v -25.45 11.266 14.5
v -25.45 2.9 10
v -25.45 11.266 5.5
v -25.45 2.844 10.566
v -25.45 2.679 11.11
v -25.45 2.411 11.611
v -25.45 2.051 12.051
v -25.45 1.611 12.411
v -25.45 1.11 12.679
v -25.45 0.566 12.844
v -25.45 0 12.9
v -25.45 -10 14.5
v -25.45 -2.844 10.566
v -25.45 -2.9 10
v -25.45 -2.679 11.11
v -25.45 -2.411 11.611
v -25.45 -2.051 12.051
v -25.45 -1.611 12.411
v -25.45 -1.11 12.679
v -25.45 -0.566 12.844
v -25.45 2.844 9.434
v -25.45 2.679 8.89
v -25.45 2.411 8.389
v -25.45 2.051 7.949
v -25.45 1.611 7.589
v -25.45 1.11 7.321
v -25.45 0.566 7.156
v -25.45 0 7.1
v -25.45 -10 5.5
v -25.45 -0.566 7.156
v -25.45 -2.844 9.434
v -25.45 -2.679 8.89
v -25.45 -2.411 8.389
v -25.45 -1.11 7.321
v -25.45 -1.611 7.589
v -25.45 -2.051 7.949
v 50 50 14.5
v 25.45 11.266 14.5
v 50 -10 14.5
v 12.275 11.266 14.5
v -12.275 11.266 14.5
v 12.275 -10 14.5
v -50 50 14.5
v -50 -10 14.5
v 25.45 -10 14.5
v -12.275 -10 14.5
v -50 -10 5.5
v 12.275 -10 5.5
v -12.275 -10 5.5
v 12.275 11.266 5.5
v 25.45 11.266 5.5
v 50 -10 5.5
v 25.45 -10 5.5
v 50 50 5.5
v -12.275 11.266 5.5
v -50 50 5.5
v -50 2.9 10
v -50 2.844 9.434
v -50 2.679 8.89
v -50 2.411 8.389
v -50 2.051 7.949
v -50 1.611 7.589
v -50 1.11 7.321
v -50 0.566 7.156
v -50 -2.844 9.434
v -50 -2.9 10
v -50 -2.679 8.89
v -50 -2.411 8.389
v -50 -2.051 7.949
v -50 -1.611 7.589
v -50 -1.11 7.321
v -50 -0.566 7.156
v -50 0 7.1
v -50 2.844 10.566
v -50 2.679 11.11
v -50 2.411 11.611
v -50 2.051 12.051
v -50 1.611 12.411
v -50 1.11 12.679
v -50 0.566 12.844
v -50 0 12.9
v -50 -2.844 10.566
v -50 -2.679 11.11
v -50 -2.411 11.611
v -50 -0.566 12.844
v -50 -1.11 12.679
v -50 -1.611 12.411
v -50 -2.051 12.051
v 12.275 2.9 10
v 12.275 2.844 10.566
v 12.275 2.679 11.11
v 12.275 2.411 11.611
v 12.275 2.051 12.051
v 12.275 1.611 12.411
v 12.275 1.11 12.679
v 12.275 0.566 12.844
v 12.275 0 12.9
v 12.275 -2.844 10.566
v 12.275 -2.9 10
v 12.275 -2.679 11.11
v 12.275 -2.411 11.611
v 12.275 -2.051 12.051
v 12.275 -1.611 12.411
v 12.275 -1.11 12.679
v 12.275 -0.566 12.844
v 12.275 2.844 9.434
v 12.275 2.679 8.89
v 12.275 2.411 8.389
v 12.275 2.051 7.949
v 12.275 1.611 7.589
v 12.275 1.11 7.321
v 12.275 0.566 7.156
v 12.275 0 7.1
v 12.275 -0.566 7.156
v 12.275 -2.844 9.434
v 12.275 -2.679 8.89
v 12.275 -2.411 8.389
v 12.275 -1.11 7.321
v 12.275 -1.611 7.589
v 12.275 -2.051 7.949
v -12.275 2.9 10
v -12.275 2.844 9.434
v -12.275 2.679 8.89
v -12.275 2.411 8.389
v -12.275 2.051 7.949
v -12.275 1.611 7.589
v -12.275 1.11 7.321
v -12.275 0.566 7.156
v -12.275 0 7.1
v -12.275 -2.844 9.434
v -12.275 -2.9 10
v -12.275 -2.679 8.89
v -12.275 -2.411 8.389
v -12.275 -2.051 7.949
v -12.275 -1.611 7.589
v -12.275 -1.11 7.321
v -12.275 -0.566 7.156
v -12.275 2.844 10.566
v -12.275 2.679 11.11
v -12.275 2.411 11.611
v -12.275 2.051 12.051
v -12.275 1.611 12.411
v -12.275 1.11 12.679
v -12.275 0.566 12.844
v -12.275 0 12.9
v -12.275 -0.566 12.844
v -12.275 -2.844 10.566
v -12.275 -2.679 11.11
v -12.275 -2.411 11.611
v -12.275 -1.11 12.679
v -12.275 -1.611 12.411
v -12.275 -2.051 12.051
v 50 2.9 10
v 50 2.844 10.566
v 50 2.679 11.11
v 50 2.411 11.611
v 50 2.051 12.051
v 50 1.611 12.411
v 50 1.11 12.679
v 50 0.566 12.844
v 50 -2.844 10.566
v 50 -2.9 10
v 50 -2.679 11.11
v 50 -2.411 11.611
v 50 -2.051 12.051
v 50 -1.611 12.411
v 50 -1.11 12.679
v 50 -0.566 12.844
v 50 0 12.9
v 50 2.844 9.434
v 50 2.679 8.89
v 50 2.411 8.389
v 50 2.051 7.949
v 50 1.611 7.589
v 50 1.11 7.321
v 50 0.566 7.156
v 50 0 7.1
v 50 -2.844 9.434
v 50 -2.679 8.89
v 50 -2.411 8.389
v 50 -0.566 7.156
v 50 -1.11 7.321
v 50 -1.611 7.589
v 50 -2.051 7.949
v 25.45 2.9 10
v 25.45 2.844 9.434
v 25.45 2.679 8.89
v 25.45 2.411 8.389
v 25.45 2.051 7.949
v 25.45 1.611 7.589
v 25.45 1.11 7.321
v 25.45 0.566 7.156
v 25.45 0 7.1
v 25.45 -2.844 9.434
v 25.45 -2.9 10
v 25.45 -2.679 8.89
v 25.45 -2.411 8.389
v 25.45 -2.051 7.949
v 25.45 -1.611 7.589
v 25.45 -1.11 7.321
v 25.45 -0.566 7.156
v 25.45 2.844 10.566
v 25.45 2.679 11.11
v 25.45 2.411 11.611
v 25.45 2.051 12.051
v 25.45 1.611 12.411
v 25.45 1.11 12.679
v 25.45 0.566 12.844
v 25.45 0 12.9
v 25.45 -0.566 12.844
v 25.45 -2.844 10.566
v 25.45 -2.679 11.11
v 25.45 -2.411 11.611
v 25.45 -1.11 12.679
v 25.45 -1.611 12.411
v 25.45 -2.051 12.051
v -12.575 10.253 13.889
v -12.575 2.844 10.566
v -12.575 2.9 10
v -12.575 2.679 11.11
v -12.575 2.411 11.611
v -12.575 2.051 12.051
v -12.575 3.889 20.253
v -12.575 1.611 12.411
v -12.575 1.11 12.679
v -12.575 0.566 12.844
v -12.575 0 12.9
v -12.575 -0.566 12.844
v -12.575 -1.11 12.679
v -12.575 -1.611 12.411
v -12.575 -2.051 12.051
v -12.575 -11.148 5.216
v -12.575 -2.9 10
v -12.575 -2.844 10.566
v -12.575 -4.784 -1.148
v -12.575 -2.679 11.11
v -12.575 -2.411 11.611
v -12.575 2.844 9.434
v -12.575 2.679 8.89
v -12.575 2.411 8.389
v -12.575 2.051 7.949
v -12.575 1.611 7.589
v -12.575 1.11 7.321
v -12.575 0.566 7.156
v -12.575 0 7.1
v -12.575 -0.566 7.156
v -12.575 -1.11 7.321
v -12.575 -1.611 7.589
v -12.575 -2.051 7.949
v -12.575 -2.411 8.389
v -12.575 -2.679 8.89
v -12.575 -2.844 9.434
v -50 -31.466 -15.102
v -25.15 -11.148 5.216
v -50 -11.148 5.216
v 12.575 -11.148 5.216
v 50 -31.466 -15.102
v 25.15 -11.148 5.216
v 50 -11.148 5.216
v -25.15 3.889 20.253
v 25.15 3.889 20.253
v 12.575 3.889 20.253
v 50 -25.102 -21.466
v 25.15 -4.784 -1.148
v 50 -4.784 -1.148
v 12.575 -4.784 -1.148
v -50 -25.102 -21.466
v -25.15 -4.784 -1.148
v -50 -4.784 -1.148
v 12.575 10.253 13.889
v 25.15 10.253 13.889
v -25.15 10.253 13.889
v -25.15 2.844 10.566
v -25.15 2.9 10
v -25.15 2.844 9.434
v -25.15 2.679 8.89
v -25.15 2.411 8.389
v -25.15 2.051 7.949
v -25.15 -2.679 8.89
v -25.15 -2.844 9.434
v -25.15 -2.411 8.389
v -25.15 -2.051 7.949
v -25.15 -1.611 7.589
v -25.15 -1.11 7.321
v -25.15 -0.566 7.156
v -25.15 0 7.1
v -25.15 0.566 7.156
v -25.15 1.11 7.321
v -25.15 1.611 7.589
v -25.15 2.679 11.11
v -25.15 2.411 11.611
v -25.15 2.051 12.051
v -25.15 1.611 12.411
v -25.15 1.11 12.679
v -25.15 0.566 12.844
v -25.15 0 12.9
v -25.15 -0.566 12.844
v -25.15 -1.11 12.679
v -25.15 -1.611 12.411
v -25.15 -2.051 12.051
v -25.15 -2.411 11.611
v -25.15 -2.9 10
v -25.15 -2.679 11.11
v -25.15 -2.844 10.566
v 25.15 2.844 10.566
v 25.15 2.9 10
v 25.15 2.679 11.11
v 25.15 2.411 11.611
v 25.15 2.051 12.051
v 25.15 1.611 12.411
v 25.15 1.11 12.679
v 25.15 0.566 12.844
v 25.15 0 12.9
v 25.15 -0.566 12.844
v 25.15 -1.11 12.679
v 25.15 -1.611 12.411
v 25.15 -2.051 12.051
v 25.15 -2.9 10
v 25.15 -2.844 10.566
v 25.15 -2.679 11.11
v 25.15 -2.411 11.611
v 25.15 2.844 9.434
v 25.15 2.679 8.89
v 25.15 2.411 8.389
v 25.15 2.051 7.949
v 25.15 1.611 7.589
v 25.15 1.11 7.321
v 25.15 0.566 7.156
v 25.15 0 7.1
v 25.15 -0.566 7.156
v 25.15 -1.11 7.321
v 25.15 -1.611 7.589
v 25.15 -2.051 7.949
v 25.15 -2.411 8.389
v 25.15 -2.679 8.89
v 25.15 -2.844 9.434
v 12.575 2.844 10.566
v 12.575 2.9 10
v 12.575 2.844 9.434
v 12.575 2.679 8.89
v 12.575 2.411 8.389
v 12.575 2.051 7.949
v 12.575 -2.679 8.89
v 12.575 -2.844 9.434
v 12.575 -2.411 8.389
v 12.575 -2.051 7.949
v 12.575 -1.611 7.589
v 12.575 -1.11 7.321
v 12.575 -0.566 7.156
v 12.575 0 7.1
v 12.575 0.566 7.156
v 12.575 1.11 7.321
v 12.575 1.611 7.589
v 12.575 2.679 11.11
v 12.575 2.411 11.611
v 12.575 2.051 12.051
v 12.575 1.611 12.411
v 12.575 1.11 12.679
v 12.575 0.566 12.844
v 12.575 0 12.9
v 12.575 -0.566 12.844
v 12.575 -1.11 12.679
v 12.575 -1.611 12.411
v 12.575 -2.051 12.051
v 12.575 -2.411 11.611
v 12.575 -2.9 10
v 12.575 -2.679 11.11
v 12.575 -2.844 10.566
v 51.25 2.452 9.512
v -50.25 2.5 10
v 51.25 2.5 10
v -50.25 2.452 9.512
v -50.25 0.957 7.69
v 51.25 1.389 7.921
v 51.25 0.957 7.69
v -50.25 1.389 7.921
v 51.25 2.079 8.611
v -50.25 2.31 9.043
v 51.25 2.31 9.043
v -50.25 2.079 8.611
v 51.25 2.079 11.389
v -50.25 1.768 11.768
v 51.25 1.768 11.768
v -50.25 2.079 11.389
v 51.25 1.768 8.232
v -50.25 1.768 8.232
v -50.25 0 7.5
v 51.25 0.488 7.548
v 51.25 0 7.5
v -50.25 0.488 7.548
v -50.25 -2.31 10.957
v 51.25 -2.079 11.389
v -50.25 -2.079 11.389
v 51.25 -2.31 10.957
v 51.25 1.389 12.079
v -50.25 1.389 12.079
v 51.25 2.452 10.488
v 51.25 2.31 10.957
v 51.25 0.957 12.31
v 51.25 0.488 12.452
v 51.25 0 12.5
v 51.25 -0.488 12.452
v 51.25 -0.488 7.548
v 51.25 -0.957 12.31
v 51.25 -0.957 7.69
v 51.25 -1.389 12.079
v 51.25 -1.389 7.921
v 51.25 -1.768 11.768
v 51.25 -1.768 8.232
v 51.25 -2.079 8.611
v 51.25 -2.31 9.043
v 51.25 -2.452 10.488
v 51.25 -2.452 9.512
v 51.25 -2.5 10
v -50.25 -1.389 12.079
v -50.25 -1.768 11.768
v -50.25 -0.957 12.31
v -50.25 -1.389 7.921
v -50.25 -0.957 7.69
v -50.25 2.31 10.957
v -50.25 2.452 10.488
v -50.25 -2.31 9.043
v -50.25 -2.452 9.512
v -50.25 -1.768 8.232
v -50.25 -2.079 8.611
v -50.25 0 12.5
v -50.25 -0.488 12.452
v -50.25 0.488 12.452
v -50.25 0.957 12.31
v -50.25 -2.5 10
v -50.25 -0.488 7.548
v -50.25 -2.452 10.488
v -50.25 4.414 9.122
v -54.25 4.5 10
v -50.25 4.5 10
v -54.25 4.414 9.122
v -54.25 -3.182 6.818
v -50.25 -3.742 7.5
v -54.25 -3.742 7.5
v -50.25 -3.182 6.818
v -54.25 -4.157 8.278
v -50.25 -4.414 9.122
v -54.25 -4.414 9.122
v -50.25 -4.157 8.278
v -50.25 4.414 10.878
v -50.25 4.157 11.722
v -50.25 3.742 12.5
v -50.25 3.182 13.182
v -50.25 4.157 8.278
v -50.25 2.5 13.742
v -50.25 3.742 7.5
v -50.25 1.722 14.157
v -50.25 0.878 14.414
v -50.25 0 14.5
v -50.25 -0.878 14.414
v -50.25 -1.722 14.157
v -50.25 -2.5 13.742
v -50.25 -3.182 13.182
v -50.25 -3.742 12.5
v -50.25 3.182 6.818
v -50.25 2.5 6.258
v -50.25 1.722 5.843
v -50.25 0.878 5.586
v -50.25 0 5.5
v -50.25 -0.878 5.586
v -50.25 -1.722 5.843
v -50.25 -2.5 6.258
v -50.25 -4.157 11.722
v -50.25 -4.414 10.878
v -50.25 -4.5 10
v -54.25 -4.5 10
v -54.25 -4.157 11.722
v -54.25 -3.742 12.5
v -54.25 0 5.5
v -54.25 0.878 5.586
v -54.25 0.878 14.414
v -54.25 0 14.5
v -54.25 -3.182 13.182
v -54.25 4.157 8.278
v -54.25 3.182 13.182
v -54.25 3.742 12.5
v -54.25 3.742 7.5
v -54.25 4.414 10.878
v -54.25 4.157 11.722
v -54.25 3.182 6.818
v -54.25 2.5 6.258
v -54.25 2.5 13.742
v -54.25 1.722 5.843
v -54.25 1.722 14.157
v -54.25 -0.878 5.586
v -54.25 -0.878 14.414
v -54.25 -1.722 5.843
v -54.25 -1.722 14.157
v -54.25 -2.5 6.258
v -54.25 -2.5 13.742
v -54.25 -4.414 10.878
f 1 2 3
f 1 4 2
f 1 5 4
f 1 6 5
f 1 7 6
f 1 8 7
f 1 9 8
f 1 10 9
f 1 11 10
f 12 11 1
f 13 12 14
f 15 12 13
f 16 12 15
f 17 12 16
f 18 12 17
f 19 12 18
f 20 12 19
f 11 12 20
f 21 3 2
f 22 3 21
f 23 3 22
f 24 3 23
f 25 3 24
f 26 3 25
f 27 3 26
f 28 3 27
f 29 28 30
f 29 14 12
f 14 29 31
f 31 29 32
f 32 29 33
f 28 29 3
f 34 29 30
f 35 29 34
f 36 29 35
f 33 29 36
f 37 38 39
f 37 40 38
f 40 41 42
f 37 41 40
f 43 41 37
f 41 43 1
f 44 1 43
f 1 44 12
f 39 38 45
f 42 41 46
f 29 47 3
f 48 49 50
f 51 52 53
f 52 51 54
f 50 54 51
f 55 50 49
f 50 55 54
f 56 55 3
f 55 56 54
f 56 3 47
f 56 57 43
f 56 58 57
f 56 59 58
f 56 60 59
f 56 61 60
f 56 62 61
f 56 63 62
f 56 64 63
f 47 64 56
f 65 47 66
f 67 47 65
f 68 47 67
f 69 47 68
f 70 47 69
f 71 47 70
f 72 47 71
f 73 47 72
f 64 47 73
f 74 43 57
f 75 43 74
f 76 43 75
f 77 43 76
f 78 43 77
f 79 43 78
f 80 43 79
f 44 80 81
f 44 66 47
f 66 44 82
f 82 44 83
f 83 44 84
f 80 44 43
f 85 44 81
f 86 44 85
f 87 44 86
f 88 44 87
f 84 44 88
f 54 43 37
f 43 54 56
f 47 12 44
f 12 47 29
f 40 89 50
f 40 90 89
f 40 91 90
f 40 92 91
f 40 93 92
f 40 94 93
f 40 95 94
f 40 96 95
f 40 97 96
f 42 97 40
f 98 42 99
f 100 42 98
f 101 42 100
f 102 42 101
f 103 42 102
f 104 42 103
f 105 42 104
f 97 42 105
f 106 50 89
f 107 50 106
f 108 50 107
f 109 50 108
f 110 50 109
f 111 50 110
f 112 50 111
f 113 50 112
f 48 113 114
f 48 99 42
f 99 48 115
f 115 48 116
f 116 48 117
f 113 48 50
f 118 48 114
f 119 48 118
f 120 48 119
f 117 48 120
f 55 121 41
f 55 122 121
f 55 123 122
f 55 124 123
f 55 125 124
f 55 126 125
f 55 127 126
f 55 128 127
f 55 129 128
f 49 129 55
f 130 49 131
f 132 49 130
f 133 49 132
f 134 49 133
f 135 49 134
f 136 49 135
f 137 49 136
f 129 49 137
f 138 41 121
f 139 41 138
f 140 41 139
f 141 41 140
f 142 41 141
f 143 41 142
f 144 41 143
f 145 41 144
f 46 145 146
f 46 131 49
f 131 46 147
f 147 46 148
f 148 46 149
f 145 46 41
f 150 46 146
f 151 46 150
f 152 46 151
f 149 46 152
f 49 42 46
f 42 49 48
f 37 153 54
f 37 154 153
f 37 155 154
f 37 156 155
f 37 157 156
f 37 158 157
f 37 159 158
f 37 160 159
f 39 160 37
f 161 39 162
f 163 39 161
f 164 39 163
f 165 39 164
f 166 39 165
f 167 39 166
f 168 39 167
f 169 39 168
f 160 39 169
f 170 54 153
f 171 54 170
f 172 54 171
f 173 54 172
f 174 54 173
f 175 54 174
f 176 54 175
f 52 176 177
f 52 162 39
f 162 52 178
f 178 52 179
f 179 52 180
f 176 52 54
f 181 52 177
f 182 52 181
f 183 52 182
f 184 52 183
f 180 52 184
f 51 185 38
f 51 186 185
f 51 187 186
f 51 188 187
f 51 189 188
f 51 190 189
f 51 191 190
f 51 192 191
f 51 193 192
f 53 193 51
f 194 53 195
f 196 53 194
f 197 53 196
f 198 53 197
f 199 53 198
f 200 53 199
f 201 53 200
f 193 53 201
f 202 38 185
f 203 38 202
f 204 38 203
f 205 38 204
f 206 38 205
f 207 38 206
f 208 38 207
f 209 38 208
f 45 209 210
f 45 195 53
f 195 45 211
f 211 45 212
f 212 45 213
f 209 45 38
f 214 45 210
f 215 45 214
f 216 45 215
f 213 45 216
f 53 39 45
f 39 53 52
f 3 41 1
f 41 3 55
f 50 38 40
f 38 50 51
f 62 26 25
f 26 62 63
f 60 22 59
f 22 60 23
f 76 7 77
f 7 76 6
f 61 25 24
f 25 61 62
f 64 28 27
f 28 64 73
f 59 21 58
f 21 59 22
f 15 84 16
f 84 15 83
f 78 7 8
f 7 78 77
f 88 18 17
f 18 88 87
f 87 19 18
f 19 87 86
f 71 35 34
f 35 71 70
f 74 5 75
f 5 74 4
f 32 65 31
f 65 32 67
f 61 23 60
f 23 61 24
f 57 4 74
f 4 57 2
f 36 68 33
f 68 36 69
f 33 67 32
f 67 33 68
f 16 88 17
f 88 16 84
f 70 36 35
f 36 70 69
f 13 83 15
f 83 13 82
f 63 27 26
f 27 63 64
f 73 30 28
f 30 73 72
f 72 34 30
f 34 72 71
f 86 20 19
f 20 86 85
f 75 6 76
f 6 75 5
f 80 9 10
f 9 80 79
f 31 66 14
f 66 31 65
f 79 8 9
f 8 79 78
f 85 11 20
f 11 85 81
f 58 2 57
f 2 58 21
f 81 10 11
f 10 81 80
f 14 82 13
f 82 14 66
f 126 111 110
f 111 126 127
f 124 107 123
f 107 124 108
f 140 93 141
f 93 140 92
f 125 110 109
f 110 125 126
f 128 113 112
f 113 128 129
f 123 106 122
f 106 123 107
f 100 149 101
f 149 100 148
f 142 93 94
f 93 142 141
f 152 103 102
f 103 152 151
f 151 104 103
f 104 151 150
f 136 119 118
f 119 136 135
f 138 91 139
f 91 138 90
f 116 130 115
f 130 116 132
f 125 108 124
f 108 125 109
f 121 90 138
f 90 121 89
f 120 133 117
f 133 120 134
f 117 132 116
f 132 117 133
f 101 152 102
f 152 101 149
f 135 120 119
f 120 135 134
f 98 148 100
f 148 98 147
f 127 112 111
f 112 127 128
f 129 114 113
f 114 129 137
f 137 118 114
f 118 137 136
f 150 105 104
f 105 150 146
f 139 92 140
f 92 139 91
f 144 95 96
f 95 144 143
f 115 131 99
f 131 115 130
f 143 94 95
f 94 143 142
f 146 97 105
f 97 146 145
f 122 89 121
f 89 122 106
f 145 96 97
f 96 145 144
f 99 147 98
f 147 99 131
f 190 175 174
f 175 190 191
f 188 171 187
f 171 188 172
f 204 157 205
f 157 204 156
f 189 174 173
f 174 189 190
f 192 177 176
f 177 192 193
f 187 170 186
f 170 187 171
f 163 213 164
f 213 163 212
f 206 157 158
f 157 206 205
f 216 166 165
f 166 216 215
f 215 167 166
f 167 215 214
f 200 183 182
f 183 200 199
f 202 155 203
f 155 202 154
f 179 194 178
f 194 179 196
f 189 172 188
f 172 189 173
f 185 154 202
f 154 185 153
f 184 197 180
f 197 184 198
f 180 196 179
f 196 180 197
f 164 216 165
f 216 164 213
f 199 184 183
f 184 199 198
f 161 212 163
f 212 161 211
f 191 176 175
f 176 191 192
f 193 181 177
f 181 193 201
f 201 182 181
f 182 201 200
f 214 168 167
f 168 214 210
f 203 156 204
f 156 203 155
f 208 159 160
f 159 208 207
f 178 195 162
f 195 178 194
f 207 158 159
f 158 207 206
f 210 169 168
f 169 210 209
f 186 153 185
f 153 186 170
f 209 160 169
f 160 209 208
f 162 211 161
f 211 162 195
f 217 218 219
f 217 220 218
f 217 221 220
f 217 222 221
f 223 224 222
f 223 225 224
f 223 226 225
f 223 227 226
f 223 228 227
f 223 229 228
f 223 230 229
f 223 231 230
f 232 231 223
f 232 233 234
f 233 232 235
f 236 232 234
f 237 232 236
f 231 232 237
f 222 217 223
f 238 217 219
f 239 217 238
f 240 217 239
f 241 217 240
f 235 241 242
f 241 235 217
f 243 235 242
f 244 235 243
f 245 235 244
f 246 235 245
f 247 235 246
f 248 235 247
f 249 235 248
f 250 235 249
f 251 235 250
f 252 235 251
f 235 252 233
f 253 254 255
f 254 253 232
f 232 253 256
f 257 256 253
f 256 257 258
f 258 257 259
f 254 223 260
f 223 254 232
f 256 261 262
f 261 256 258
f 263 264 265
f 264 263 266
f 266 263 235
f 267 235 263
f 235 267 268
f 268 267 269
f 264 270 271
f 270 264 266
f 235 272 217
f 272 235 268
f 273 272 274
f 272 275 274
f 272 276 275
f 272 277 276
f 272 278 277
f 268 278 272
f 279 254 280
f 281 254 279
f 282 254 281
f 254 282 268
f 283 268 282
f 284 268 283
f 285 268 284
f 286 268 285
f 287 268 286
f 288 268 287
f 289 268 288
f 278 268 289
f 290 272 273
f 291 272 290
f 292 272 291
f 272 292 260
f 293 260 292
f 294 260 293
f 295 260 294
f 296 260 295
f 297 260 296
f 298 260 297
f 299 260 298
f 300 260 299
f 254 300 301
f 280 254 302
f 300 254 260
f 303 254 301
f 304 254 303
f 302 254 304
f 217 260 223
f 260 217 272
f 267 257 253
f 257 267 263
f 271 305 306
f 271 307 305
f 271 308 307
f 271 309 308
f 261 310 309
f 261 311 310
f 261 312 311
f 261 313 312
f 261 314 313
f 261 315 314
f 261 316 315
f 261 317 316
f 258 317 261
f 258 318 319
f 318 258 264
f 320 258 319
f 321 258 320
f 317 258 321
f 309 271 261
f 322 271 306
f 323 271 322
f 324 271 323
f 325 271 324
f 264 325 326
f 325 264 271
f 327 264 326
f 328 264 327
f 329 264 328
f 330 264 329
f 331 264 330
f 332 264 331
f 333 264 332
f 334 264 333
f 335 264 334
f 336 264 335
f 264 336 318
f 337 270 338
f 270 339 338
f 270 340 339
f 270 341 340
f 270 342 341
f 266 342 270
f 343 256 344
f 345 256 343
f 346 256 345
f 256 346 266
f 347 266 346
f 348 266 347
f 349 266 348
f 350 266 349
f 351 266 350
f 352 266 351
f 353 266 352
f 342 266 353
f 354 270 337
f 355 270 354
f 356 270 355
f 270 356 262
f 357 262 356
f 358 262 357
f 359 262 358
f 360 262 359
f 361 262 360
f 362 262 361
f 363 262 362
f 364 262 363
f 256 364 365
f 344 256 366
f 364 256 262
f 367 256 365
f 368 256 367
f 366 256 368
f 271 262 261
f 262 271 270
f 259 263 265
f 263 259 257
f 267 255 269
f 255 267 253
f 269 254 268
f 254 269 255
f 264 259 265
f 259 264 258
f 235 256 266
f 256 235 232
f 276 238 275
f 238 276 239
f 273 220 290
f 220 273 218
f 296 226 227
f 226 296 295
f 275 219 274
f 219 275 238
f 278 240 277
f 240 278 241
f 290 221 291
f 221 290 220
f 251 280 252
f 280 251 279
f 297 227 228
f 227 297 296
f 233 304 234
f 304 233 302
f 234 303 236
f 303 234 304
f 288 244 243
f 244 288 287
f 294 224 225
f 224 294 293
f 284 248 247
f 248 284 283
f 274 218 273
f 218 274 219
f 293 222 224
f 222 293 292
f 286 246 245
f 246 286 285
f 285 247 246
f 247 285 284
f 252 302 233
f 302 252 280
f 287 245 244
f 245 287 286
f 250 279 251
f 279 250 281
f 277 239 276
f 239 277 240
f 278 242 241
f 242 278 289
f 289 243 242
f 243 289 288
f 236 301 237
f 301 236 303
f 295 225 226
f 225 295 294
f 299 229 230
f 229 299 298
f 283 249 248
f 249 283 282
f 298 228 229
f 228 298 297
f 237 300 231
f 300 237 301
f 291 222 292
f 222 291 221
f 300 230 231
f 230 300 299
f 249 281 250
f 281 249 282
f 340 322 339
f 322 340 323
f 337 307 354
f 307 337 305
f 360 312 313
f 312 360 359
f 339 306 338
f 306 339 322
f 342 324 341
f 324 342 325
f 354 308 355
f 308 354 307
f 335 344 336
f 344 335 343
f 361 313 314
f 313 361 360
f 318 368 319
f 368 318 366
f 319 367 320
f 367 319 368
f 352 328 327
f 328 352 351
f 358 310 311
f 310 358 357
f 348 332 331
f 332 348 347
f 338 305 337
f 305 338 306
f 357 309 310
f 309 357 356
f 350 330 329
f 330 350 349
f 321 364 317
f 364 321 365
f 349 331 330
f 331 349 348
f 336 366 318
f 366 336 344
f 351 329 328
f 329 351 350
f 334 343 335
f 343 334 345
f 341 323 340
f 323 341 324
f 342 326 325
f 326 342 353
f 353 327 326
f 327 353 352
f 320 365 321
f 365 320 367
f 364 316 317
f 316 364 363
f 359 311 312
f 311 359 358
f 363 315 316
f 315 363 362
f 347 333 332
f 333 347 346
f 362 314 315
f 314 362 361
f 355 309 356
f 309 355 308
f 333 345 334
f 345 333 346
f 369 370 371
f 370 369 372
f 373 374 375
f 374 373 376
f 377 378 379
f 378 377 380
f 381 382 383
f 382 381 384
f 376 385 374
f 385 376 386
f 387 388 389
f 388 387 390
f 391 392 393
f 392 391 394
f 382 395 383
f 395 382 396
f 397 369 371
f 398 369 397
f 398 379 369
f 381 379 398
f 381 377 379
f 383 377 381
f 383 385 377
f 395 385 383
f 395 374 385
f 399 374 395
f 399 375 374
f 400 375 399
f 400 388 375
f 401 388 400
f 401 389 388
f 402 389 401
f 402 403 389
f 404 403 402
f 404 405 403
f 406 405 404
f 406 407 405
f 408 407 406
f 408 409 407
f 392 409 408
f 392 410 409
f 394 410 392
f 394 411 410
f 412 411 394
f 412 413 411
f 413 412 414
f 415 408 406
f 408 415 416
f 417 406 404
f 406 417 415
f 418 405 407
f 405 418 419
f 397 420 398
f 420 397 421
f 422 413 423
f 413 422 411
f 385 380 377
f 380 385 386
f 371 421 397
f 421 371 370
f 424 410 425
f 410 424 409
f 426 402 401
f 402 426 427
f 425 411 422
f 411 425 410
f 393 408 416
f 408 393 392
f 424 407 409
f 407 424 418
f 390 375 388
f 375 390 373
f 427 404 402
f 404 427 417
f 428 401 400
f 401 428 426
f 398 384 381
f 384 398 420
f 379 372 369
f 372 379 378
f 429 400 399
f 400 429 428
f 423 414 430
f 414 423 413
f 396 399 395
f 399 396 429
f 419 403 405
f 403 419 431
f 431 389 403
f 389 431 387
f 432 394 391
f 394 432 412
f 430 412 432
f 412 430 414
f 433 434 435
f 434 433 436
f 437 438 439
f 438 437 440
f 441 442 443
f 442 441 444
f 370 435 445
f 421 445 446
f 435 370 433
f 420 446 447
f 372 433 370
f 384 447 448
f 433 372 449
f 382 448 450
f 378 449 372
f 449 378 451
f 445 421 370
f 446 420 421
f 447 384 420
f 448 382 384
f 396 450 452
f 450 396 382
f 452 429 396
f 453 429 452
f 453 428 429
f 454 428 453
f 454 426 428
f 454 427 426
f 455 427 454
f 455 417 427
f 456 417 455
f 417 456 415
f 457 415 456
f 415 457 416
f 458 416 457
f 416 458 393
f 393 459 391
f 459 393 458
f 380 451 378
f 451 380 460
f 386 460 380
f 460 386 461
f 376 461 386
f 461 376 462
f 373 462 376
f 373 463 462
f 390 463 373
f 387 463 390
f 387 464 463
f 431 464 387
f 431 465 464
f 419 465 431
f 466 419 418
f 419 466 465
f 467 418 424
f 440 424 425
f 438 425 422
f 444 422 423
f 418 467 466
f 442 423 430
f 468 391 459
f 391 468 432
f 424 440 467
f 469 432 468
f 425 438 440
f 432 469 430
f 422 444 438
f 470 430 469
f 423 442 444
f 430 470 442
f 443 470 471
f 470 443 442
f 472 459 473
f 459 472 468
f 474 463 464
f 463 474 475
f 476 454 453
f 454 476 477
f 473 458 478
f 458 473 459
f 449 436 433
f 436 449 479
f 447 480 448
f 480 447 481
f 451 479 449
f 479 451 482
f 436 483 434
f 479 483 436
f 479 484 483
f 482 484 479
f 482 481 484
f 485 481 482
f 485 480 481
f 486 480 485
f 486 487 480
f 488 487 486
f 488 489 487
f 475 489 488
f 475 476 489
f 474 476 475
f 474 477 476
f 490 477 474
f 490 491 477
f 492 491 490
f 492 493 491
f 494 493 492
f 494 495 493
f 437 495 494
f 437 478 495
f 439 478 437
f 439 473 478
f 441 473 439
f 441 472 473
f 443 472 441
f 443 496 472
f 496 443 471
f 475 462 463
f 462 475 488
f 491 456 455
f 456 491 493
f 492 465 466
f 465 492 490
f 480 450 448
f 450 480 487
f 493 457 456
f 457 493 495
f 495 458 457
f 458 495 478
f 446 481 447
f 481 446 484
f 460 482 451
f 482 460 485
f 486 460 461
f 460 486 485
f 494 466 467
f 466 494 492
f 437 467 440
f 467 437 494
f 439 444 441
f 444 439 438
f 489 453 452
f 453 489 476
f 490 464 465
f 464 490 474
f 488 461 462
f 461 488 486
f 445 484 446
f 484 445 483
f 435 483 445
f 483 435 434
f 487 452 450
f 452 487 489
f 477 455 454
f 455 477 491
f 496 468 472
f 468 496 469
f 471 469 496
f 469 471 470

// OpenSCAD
$fn = 32;

// ------------------------------------------------------------------------
// Butt hinge: hinge 100 mm, leaf swung 45 deg
// Every part is its own module, assembly() places every instance.
// ------------------------------------------------------------------------

// --- part 1 ---
module hinge_base() {
  difference() {
    union() {
      translate([-50, -10, -4.5]) cube([24.55, 60, 9]);
      translate([-12.275, -10, -4.5]) cube([24.55, 60, 9]);
      translate([25.45, -10, -4.5]) cube([24.55, 60, 9]);
      translate([-50, 11.266, -4.5]) cube([100, 38.734, 9]);
    }
    translate([-37.725, 0, 0]) rotate([0, 90, 0]) cylinder(h = 26.55, d = 5.8, center = true);
    translate([0, 0, 0]) rotate([0, 90, 0]) cylinder(h = 26.55, d = 5.8, center = true);
    translate([37.725, 0, 0]) rotate([0, 90, 0]) cylinder(h = 26.55, d = 5.8, center = true);
  }
}

// --- part 2 ---
module hinge_mover() {
  difference() {
    union() {
      translate([-25.15, -40, -4.5]) cube([12.575, 50, 9]);
      translate([12.575, -40, -4.5]) cube([12.575, 50, 9]);
      translate([-50, -40, -4.5]) cube([100, 28.734, 9]);
    }
    translate([-18.863, 0, 0]) rotate([0, 90, 0]) cylinder(h = 14.575, d = 5.8, center = true);
    translate([18.863, 0, 0]) rotate([0, 90, 0]) cylinder(h = 14.575, d = 5.8, center = true);
  }
}

// --- part 3 ---
module hinge_pin() {
  rotate([0, 90, 0]) cylinder(h = 102.5, d = 5, center = true);
  translate([-54.25, 0, 0]) rotate([0, 90, 0]) cylinder(h = 4, d = 9);
}

// --- assembly ---
module assembly() {
  color([0.80, 0.24, 0.20]) translate([0, 0, 10]) rotate([0, 0, 0]) hinge_base();
  color([0.20, 0.45, 0.75]) translate([0, 0, 10]) rotate([45, 0, 0]) hinge_mover();
  color([0.25, 0.62, 0.32]) translate([0, 0, 10]) rotate([0, 0, 0]) hinge_pin();
}

assembly();
